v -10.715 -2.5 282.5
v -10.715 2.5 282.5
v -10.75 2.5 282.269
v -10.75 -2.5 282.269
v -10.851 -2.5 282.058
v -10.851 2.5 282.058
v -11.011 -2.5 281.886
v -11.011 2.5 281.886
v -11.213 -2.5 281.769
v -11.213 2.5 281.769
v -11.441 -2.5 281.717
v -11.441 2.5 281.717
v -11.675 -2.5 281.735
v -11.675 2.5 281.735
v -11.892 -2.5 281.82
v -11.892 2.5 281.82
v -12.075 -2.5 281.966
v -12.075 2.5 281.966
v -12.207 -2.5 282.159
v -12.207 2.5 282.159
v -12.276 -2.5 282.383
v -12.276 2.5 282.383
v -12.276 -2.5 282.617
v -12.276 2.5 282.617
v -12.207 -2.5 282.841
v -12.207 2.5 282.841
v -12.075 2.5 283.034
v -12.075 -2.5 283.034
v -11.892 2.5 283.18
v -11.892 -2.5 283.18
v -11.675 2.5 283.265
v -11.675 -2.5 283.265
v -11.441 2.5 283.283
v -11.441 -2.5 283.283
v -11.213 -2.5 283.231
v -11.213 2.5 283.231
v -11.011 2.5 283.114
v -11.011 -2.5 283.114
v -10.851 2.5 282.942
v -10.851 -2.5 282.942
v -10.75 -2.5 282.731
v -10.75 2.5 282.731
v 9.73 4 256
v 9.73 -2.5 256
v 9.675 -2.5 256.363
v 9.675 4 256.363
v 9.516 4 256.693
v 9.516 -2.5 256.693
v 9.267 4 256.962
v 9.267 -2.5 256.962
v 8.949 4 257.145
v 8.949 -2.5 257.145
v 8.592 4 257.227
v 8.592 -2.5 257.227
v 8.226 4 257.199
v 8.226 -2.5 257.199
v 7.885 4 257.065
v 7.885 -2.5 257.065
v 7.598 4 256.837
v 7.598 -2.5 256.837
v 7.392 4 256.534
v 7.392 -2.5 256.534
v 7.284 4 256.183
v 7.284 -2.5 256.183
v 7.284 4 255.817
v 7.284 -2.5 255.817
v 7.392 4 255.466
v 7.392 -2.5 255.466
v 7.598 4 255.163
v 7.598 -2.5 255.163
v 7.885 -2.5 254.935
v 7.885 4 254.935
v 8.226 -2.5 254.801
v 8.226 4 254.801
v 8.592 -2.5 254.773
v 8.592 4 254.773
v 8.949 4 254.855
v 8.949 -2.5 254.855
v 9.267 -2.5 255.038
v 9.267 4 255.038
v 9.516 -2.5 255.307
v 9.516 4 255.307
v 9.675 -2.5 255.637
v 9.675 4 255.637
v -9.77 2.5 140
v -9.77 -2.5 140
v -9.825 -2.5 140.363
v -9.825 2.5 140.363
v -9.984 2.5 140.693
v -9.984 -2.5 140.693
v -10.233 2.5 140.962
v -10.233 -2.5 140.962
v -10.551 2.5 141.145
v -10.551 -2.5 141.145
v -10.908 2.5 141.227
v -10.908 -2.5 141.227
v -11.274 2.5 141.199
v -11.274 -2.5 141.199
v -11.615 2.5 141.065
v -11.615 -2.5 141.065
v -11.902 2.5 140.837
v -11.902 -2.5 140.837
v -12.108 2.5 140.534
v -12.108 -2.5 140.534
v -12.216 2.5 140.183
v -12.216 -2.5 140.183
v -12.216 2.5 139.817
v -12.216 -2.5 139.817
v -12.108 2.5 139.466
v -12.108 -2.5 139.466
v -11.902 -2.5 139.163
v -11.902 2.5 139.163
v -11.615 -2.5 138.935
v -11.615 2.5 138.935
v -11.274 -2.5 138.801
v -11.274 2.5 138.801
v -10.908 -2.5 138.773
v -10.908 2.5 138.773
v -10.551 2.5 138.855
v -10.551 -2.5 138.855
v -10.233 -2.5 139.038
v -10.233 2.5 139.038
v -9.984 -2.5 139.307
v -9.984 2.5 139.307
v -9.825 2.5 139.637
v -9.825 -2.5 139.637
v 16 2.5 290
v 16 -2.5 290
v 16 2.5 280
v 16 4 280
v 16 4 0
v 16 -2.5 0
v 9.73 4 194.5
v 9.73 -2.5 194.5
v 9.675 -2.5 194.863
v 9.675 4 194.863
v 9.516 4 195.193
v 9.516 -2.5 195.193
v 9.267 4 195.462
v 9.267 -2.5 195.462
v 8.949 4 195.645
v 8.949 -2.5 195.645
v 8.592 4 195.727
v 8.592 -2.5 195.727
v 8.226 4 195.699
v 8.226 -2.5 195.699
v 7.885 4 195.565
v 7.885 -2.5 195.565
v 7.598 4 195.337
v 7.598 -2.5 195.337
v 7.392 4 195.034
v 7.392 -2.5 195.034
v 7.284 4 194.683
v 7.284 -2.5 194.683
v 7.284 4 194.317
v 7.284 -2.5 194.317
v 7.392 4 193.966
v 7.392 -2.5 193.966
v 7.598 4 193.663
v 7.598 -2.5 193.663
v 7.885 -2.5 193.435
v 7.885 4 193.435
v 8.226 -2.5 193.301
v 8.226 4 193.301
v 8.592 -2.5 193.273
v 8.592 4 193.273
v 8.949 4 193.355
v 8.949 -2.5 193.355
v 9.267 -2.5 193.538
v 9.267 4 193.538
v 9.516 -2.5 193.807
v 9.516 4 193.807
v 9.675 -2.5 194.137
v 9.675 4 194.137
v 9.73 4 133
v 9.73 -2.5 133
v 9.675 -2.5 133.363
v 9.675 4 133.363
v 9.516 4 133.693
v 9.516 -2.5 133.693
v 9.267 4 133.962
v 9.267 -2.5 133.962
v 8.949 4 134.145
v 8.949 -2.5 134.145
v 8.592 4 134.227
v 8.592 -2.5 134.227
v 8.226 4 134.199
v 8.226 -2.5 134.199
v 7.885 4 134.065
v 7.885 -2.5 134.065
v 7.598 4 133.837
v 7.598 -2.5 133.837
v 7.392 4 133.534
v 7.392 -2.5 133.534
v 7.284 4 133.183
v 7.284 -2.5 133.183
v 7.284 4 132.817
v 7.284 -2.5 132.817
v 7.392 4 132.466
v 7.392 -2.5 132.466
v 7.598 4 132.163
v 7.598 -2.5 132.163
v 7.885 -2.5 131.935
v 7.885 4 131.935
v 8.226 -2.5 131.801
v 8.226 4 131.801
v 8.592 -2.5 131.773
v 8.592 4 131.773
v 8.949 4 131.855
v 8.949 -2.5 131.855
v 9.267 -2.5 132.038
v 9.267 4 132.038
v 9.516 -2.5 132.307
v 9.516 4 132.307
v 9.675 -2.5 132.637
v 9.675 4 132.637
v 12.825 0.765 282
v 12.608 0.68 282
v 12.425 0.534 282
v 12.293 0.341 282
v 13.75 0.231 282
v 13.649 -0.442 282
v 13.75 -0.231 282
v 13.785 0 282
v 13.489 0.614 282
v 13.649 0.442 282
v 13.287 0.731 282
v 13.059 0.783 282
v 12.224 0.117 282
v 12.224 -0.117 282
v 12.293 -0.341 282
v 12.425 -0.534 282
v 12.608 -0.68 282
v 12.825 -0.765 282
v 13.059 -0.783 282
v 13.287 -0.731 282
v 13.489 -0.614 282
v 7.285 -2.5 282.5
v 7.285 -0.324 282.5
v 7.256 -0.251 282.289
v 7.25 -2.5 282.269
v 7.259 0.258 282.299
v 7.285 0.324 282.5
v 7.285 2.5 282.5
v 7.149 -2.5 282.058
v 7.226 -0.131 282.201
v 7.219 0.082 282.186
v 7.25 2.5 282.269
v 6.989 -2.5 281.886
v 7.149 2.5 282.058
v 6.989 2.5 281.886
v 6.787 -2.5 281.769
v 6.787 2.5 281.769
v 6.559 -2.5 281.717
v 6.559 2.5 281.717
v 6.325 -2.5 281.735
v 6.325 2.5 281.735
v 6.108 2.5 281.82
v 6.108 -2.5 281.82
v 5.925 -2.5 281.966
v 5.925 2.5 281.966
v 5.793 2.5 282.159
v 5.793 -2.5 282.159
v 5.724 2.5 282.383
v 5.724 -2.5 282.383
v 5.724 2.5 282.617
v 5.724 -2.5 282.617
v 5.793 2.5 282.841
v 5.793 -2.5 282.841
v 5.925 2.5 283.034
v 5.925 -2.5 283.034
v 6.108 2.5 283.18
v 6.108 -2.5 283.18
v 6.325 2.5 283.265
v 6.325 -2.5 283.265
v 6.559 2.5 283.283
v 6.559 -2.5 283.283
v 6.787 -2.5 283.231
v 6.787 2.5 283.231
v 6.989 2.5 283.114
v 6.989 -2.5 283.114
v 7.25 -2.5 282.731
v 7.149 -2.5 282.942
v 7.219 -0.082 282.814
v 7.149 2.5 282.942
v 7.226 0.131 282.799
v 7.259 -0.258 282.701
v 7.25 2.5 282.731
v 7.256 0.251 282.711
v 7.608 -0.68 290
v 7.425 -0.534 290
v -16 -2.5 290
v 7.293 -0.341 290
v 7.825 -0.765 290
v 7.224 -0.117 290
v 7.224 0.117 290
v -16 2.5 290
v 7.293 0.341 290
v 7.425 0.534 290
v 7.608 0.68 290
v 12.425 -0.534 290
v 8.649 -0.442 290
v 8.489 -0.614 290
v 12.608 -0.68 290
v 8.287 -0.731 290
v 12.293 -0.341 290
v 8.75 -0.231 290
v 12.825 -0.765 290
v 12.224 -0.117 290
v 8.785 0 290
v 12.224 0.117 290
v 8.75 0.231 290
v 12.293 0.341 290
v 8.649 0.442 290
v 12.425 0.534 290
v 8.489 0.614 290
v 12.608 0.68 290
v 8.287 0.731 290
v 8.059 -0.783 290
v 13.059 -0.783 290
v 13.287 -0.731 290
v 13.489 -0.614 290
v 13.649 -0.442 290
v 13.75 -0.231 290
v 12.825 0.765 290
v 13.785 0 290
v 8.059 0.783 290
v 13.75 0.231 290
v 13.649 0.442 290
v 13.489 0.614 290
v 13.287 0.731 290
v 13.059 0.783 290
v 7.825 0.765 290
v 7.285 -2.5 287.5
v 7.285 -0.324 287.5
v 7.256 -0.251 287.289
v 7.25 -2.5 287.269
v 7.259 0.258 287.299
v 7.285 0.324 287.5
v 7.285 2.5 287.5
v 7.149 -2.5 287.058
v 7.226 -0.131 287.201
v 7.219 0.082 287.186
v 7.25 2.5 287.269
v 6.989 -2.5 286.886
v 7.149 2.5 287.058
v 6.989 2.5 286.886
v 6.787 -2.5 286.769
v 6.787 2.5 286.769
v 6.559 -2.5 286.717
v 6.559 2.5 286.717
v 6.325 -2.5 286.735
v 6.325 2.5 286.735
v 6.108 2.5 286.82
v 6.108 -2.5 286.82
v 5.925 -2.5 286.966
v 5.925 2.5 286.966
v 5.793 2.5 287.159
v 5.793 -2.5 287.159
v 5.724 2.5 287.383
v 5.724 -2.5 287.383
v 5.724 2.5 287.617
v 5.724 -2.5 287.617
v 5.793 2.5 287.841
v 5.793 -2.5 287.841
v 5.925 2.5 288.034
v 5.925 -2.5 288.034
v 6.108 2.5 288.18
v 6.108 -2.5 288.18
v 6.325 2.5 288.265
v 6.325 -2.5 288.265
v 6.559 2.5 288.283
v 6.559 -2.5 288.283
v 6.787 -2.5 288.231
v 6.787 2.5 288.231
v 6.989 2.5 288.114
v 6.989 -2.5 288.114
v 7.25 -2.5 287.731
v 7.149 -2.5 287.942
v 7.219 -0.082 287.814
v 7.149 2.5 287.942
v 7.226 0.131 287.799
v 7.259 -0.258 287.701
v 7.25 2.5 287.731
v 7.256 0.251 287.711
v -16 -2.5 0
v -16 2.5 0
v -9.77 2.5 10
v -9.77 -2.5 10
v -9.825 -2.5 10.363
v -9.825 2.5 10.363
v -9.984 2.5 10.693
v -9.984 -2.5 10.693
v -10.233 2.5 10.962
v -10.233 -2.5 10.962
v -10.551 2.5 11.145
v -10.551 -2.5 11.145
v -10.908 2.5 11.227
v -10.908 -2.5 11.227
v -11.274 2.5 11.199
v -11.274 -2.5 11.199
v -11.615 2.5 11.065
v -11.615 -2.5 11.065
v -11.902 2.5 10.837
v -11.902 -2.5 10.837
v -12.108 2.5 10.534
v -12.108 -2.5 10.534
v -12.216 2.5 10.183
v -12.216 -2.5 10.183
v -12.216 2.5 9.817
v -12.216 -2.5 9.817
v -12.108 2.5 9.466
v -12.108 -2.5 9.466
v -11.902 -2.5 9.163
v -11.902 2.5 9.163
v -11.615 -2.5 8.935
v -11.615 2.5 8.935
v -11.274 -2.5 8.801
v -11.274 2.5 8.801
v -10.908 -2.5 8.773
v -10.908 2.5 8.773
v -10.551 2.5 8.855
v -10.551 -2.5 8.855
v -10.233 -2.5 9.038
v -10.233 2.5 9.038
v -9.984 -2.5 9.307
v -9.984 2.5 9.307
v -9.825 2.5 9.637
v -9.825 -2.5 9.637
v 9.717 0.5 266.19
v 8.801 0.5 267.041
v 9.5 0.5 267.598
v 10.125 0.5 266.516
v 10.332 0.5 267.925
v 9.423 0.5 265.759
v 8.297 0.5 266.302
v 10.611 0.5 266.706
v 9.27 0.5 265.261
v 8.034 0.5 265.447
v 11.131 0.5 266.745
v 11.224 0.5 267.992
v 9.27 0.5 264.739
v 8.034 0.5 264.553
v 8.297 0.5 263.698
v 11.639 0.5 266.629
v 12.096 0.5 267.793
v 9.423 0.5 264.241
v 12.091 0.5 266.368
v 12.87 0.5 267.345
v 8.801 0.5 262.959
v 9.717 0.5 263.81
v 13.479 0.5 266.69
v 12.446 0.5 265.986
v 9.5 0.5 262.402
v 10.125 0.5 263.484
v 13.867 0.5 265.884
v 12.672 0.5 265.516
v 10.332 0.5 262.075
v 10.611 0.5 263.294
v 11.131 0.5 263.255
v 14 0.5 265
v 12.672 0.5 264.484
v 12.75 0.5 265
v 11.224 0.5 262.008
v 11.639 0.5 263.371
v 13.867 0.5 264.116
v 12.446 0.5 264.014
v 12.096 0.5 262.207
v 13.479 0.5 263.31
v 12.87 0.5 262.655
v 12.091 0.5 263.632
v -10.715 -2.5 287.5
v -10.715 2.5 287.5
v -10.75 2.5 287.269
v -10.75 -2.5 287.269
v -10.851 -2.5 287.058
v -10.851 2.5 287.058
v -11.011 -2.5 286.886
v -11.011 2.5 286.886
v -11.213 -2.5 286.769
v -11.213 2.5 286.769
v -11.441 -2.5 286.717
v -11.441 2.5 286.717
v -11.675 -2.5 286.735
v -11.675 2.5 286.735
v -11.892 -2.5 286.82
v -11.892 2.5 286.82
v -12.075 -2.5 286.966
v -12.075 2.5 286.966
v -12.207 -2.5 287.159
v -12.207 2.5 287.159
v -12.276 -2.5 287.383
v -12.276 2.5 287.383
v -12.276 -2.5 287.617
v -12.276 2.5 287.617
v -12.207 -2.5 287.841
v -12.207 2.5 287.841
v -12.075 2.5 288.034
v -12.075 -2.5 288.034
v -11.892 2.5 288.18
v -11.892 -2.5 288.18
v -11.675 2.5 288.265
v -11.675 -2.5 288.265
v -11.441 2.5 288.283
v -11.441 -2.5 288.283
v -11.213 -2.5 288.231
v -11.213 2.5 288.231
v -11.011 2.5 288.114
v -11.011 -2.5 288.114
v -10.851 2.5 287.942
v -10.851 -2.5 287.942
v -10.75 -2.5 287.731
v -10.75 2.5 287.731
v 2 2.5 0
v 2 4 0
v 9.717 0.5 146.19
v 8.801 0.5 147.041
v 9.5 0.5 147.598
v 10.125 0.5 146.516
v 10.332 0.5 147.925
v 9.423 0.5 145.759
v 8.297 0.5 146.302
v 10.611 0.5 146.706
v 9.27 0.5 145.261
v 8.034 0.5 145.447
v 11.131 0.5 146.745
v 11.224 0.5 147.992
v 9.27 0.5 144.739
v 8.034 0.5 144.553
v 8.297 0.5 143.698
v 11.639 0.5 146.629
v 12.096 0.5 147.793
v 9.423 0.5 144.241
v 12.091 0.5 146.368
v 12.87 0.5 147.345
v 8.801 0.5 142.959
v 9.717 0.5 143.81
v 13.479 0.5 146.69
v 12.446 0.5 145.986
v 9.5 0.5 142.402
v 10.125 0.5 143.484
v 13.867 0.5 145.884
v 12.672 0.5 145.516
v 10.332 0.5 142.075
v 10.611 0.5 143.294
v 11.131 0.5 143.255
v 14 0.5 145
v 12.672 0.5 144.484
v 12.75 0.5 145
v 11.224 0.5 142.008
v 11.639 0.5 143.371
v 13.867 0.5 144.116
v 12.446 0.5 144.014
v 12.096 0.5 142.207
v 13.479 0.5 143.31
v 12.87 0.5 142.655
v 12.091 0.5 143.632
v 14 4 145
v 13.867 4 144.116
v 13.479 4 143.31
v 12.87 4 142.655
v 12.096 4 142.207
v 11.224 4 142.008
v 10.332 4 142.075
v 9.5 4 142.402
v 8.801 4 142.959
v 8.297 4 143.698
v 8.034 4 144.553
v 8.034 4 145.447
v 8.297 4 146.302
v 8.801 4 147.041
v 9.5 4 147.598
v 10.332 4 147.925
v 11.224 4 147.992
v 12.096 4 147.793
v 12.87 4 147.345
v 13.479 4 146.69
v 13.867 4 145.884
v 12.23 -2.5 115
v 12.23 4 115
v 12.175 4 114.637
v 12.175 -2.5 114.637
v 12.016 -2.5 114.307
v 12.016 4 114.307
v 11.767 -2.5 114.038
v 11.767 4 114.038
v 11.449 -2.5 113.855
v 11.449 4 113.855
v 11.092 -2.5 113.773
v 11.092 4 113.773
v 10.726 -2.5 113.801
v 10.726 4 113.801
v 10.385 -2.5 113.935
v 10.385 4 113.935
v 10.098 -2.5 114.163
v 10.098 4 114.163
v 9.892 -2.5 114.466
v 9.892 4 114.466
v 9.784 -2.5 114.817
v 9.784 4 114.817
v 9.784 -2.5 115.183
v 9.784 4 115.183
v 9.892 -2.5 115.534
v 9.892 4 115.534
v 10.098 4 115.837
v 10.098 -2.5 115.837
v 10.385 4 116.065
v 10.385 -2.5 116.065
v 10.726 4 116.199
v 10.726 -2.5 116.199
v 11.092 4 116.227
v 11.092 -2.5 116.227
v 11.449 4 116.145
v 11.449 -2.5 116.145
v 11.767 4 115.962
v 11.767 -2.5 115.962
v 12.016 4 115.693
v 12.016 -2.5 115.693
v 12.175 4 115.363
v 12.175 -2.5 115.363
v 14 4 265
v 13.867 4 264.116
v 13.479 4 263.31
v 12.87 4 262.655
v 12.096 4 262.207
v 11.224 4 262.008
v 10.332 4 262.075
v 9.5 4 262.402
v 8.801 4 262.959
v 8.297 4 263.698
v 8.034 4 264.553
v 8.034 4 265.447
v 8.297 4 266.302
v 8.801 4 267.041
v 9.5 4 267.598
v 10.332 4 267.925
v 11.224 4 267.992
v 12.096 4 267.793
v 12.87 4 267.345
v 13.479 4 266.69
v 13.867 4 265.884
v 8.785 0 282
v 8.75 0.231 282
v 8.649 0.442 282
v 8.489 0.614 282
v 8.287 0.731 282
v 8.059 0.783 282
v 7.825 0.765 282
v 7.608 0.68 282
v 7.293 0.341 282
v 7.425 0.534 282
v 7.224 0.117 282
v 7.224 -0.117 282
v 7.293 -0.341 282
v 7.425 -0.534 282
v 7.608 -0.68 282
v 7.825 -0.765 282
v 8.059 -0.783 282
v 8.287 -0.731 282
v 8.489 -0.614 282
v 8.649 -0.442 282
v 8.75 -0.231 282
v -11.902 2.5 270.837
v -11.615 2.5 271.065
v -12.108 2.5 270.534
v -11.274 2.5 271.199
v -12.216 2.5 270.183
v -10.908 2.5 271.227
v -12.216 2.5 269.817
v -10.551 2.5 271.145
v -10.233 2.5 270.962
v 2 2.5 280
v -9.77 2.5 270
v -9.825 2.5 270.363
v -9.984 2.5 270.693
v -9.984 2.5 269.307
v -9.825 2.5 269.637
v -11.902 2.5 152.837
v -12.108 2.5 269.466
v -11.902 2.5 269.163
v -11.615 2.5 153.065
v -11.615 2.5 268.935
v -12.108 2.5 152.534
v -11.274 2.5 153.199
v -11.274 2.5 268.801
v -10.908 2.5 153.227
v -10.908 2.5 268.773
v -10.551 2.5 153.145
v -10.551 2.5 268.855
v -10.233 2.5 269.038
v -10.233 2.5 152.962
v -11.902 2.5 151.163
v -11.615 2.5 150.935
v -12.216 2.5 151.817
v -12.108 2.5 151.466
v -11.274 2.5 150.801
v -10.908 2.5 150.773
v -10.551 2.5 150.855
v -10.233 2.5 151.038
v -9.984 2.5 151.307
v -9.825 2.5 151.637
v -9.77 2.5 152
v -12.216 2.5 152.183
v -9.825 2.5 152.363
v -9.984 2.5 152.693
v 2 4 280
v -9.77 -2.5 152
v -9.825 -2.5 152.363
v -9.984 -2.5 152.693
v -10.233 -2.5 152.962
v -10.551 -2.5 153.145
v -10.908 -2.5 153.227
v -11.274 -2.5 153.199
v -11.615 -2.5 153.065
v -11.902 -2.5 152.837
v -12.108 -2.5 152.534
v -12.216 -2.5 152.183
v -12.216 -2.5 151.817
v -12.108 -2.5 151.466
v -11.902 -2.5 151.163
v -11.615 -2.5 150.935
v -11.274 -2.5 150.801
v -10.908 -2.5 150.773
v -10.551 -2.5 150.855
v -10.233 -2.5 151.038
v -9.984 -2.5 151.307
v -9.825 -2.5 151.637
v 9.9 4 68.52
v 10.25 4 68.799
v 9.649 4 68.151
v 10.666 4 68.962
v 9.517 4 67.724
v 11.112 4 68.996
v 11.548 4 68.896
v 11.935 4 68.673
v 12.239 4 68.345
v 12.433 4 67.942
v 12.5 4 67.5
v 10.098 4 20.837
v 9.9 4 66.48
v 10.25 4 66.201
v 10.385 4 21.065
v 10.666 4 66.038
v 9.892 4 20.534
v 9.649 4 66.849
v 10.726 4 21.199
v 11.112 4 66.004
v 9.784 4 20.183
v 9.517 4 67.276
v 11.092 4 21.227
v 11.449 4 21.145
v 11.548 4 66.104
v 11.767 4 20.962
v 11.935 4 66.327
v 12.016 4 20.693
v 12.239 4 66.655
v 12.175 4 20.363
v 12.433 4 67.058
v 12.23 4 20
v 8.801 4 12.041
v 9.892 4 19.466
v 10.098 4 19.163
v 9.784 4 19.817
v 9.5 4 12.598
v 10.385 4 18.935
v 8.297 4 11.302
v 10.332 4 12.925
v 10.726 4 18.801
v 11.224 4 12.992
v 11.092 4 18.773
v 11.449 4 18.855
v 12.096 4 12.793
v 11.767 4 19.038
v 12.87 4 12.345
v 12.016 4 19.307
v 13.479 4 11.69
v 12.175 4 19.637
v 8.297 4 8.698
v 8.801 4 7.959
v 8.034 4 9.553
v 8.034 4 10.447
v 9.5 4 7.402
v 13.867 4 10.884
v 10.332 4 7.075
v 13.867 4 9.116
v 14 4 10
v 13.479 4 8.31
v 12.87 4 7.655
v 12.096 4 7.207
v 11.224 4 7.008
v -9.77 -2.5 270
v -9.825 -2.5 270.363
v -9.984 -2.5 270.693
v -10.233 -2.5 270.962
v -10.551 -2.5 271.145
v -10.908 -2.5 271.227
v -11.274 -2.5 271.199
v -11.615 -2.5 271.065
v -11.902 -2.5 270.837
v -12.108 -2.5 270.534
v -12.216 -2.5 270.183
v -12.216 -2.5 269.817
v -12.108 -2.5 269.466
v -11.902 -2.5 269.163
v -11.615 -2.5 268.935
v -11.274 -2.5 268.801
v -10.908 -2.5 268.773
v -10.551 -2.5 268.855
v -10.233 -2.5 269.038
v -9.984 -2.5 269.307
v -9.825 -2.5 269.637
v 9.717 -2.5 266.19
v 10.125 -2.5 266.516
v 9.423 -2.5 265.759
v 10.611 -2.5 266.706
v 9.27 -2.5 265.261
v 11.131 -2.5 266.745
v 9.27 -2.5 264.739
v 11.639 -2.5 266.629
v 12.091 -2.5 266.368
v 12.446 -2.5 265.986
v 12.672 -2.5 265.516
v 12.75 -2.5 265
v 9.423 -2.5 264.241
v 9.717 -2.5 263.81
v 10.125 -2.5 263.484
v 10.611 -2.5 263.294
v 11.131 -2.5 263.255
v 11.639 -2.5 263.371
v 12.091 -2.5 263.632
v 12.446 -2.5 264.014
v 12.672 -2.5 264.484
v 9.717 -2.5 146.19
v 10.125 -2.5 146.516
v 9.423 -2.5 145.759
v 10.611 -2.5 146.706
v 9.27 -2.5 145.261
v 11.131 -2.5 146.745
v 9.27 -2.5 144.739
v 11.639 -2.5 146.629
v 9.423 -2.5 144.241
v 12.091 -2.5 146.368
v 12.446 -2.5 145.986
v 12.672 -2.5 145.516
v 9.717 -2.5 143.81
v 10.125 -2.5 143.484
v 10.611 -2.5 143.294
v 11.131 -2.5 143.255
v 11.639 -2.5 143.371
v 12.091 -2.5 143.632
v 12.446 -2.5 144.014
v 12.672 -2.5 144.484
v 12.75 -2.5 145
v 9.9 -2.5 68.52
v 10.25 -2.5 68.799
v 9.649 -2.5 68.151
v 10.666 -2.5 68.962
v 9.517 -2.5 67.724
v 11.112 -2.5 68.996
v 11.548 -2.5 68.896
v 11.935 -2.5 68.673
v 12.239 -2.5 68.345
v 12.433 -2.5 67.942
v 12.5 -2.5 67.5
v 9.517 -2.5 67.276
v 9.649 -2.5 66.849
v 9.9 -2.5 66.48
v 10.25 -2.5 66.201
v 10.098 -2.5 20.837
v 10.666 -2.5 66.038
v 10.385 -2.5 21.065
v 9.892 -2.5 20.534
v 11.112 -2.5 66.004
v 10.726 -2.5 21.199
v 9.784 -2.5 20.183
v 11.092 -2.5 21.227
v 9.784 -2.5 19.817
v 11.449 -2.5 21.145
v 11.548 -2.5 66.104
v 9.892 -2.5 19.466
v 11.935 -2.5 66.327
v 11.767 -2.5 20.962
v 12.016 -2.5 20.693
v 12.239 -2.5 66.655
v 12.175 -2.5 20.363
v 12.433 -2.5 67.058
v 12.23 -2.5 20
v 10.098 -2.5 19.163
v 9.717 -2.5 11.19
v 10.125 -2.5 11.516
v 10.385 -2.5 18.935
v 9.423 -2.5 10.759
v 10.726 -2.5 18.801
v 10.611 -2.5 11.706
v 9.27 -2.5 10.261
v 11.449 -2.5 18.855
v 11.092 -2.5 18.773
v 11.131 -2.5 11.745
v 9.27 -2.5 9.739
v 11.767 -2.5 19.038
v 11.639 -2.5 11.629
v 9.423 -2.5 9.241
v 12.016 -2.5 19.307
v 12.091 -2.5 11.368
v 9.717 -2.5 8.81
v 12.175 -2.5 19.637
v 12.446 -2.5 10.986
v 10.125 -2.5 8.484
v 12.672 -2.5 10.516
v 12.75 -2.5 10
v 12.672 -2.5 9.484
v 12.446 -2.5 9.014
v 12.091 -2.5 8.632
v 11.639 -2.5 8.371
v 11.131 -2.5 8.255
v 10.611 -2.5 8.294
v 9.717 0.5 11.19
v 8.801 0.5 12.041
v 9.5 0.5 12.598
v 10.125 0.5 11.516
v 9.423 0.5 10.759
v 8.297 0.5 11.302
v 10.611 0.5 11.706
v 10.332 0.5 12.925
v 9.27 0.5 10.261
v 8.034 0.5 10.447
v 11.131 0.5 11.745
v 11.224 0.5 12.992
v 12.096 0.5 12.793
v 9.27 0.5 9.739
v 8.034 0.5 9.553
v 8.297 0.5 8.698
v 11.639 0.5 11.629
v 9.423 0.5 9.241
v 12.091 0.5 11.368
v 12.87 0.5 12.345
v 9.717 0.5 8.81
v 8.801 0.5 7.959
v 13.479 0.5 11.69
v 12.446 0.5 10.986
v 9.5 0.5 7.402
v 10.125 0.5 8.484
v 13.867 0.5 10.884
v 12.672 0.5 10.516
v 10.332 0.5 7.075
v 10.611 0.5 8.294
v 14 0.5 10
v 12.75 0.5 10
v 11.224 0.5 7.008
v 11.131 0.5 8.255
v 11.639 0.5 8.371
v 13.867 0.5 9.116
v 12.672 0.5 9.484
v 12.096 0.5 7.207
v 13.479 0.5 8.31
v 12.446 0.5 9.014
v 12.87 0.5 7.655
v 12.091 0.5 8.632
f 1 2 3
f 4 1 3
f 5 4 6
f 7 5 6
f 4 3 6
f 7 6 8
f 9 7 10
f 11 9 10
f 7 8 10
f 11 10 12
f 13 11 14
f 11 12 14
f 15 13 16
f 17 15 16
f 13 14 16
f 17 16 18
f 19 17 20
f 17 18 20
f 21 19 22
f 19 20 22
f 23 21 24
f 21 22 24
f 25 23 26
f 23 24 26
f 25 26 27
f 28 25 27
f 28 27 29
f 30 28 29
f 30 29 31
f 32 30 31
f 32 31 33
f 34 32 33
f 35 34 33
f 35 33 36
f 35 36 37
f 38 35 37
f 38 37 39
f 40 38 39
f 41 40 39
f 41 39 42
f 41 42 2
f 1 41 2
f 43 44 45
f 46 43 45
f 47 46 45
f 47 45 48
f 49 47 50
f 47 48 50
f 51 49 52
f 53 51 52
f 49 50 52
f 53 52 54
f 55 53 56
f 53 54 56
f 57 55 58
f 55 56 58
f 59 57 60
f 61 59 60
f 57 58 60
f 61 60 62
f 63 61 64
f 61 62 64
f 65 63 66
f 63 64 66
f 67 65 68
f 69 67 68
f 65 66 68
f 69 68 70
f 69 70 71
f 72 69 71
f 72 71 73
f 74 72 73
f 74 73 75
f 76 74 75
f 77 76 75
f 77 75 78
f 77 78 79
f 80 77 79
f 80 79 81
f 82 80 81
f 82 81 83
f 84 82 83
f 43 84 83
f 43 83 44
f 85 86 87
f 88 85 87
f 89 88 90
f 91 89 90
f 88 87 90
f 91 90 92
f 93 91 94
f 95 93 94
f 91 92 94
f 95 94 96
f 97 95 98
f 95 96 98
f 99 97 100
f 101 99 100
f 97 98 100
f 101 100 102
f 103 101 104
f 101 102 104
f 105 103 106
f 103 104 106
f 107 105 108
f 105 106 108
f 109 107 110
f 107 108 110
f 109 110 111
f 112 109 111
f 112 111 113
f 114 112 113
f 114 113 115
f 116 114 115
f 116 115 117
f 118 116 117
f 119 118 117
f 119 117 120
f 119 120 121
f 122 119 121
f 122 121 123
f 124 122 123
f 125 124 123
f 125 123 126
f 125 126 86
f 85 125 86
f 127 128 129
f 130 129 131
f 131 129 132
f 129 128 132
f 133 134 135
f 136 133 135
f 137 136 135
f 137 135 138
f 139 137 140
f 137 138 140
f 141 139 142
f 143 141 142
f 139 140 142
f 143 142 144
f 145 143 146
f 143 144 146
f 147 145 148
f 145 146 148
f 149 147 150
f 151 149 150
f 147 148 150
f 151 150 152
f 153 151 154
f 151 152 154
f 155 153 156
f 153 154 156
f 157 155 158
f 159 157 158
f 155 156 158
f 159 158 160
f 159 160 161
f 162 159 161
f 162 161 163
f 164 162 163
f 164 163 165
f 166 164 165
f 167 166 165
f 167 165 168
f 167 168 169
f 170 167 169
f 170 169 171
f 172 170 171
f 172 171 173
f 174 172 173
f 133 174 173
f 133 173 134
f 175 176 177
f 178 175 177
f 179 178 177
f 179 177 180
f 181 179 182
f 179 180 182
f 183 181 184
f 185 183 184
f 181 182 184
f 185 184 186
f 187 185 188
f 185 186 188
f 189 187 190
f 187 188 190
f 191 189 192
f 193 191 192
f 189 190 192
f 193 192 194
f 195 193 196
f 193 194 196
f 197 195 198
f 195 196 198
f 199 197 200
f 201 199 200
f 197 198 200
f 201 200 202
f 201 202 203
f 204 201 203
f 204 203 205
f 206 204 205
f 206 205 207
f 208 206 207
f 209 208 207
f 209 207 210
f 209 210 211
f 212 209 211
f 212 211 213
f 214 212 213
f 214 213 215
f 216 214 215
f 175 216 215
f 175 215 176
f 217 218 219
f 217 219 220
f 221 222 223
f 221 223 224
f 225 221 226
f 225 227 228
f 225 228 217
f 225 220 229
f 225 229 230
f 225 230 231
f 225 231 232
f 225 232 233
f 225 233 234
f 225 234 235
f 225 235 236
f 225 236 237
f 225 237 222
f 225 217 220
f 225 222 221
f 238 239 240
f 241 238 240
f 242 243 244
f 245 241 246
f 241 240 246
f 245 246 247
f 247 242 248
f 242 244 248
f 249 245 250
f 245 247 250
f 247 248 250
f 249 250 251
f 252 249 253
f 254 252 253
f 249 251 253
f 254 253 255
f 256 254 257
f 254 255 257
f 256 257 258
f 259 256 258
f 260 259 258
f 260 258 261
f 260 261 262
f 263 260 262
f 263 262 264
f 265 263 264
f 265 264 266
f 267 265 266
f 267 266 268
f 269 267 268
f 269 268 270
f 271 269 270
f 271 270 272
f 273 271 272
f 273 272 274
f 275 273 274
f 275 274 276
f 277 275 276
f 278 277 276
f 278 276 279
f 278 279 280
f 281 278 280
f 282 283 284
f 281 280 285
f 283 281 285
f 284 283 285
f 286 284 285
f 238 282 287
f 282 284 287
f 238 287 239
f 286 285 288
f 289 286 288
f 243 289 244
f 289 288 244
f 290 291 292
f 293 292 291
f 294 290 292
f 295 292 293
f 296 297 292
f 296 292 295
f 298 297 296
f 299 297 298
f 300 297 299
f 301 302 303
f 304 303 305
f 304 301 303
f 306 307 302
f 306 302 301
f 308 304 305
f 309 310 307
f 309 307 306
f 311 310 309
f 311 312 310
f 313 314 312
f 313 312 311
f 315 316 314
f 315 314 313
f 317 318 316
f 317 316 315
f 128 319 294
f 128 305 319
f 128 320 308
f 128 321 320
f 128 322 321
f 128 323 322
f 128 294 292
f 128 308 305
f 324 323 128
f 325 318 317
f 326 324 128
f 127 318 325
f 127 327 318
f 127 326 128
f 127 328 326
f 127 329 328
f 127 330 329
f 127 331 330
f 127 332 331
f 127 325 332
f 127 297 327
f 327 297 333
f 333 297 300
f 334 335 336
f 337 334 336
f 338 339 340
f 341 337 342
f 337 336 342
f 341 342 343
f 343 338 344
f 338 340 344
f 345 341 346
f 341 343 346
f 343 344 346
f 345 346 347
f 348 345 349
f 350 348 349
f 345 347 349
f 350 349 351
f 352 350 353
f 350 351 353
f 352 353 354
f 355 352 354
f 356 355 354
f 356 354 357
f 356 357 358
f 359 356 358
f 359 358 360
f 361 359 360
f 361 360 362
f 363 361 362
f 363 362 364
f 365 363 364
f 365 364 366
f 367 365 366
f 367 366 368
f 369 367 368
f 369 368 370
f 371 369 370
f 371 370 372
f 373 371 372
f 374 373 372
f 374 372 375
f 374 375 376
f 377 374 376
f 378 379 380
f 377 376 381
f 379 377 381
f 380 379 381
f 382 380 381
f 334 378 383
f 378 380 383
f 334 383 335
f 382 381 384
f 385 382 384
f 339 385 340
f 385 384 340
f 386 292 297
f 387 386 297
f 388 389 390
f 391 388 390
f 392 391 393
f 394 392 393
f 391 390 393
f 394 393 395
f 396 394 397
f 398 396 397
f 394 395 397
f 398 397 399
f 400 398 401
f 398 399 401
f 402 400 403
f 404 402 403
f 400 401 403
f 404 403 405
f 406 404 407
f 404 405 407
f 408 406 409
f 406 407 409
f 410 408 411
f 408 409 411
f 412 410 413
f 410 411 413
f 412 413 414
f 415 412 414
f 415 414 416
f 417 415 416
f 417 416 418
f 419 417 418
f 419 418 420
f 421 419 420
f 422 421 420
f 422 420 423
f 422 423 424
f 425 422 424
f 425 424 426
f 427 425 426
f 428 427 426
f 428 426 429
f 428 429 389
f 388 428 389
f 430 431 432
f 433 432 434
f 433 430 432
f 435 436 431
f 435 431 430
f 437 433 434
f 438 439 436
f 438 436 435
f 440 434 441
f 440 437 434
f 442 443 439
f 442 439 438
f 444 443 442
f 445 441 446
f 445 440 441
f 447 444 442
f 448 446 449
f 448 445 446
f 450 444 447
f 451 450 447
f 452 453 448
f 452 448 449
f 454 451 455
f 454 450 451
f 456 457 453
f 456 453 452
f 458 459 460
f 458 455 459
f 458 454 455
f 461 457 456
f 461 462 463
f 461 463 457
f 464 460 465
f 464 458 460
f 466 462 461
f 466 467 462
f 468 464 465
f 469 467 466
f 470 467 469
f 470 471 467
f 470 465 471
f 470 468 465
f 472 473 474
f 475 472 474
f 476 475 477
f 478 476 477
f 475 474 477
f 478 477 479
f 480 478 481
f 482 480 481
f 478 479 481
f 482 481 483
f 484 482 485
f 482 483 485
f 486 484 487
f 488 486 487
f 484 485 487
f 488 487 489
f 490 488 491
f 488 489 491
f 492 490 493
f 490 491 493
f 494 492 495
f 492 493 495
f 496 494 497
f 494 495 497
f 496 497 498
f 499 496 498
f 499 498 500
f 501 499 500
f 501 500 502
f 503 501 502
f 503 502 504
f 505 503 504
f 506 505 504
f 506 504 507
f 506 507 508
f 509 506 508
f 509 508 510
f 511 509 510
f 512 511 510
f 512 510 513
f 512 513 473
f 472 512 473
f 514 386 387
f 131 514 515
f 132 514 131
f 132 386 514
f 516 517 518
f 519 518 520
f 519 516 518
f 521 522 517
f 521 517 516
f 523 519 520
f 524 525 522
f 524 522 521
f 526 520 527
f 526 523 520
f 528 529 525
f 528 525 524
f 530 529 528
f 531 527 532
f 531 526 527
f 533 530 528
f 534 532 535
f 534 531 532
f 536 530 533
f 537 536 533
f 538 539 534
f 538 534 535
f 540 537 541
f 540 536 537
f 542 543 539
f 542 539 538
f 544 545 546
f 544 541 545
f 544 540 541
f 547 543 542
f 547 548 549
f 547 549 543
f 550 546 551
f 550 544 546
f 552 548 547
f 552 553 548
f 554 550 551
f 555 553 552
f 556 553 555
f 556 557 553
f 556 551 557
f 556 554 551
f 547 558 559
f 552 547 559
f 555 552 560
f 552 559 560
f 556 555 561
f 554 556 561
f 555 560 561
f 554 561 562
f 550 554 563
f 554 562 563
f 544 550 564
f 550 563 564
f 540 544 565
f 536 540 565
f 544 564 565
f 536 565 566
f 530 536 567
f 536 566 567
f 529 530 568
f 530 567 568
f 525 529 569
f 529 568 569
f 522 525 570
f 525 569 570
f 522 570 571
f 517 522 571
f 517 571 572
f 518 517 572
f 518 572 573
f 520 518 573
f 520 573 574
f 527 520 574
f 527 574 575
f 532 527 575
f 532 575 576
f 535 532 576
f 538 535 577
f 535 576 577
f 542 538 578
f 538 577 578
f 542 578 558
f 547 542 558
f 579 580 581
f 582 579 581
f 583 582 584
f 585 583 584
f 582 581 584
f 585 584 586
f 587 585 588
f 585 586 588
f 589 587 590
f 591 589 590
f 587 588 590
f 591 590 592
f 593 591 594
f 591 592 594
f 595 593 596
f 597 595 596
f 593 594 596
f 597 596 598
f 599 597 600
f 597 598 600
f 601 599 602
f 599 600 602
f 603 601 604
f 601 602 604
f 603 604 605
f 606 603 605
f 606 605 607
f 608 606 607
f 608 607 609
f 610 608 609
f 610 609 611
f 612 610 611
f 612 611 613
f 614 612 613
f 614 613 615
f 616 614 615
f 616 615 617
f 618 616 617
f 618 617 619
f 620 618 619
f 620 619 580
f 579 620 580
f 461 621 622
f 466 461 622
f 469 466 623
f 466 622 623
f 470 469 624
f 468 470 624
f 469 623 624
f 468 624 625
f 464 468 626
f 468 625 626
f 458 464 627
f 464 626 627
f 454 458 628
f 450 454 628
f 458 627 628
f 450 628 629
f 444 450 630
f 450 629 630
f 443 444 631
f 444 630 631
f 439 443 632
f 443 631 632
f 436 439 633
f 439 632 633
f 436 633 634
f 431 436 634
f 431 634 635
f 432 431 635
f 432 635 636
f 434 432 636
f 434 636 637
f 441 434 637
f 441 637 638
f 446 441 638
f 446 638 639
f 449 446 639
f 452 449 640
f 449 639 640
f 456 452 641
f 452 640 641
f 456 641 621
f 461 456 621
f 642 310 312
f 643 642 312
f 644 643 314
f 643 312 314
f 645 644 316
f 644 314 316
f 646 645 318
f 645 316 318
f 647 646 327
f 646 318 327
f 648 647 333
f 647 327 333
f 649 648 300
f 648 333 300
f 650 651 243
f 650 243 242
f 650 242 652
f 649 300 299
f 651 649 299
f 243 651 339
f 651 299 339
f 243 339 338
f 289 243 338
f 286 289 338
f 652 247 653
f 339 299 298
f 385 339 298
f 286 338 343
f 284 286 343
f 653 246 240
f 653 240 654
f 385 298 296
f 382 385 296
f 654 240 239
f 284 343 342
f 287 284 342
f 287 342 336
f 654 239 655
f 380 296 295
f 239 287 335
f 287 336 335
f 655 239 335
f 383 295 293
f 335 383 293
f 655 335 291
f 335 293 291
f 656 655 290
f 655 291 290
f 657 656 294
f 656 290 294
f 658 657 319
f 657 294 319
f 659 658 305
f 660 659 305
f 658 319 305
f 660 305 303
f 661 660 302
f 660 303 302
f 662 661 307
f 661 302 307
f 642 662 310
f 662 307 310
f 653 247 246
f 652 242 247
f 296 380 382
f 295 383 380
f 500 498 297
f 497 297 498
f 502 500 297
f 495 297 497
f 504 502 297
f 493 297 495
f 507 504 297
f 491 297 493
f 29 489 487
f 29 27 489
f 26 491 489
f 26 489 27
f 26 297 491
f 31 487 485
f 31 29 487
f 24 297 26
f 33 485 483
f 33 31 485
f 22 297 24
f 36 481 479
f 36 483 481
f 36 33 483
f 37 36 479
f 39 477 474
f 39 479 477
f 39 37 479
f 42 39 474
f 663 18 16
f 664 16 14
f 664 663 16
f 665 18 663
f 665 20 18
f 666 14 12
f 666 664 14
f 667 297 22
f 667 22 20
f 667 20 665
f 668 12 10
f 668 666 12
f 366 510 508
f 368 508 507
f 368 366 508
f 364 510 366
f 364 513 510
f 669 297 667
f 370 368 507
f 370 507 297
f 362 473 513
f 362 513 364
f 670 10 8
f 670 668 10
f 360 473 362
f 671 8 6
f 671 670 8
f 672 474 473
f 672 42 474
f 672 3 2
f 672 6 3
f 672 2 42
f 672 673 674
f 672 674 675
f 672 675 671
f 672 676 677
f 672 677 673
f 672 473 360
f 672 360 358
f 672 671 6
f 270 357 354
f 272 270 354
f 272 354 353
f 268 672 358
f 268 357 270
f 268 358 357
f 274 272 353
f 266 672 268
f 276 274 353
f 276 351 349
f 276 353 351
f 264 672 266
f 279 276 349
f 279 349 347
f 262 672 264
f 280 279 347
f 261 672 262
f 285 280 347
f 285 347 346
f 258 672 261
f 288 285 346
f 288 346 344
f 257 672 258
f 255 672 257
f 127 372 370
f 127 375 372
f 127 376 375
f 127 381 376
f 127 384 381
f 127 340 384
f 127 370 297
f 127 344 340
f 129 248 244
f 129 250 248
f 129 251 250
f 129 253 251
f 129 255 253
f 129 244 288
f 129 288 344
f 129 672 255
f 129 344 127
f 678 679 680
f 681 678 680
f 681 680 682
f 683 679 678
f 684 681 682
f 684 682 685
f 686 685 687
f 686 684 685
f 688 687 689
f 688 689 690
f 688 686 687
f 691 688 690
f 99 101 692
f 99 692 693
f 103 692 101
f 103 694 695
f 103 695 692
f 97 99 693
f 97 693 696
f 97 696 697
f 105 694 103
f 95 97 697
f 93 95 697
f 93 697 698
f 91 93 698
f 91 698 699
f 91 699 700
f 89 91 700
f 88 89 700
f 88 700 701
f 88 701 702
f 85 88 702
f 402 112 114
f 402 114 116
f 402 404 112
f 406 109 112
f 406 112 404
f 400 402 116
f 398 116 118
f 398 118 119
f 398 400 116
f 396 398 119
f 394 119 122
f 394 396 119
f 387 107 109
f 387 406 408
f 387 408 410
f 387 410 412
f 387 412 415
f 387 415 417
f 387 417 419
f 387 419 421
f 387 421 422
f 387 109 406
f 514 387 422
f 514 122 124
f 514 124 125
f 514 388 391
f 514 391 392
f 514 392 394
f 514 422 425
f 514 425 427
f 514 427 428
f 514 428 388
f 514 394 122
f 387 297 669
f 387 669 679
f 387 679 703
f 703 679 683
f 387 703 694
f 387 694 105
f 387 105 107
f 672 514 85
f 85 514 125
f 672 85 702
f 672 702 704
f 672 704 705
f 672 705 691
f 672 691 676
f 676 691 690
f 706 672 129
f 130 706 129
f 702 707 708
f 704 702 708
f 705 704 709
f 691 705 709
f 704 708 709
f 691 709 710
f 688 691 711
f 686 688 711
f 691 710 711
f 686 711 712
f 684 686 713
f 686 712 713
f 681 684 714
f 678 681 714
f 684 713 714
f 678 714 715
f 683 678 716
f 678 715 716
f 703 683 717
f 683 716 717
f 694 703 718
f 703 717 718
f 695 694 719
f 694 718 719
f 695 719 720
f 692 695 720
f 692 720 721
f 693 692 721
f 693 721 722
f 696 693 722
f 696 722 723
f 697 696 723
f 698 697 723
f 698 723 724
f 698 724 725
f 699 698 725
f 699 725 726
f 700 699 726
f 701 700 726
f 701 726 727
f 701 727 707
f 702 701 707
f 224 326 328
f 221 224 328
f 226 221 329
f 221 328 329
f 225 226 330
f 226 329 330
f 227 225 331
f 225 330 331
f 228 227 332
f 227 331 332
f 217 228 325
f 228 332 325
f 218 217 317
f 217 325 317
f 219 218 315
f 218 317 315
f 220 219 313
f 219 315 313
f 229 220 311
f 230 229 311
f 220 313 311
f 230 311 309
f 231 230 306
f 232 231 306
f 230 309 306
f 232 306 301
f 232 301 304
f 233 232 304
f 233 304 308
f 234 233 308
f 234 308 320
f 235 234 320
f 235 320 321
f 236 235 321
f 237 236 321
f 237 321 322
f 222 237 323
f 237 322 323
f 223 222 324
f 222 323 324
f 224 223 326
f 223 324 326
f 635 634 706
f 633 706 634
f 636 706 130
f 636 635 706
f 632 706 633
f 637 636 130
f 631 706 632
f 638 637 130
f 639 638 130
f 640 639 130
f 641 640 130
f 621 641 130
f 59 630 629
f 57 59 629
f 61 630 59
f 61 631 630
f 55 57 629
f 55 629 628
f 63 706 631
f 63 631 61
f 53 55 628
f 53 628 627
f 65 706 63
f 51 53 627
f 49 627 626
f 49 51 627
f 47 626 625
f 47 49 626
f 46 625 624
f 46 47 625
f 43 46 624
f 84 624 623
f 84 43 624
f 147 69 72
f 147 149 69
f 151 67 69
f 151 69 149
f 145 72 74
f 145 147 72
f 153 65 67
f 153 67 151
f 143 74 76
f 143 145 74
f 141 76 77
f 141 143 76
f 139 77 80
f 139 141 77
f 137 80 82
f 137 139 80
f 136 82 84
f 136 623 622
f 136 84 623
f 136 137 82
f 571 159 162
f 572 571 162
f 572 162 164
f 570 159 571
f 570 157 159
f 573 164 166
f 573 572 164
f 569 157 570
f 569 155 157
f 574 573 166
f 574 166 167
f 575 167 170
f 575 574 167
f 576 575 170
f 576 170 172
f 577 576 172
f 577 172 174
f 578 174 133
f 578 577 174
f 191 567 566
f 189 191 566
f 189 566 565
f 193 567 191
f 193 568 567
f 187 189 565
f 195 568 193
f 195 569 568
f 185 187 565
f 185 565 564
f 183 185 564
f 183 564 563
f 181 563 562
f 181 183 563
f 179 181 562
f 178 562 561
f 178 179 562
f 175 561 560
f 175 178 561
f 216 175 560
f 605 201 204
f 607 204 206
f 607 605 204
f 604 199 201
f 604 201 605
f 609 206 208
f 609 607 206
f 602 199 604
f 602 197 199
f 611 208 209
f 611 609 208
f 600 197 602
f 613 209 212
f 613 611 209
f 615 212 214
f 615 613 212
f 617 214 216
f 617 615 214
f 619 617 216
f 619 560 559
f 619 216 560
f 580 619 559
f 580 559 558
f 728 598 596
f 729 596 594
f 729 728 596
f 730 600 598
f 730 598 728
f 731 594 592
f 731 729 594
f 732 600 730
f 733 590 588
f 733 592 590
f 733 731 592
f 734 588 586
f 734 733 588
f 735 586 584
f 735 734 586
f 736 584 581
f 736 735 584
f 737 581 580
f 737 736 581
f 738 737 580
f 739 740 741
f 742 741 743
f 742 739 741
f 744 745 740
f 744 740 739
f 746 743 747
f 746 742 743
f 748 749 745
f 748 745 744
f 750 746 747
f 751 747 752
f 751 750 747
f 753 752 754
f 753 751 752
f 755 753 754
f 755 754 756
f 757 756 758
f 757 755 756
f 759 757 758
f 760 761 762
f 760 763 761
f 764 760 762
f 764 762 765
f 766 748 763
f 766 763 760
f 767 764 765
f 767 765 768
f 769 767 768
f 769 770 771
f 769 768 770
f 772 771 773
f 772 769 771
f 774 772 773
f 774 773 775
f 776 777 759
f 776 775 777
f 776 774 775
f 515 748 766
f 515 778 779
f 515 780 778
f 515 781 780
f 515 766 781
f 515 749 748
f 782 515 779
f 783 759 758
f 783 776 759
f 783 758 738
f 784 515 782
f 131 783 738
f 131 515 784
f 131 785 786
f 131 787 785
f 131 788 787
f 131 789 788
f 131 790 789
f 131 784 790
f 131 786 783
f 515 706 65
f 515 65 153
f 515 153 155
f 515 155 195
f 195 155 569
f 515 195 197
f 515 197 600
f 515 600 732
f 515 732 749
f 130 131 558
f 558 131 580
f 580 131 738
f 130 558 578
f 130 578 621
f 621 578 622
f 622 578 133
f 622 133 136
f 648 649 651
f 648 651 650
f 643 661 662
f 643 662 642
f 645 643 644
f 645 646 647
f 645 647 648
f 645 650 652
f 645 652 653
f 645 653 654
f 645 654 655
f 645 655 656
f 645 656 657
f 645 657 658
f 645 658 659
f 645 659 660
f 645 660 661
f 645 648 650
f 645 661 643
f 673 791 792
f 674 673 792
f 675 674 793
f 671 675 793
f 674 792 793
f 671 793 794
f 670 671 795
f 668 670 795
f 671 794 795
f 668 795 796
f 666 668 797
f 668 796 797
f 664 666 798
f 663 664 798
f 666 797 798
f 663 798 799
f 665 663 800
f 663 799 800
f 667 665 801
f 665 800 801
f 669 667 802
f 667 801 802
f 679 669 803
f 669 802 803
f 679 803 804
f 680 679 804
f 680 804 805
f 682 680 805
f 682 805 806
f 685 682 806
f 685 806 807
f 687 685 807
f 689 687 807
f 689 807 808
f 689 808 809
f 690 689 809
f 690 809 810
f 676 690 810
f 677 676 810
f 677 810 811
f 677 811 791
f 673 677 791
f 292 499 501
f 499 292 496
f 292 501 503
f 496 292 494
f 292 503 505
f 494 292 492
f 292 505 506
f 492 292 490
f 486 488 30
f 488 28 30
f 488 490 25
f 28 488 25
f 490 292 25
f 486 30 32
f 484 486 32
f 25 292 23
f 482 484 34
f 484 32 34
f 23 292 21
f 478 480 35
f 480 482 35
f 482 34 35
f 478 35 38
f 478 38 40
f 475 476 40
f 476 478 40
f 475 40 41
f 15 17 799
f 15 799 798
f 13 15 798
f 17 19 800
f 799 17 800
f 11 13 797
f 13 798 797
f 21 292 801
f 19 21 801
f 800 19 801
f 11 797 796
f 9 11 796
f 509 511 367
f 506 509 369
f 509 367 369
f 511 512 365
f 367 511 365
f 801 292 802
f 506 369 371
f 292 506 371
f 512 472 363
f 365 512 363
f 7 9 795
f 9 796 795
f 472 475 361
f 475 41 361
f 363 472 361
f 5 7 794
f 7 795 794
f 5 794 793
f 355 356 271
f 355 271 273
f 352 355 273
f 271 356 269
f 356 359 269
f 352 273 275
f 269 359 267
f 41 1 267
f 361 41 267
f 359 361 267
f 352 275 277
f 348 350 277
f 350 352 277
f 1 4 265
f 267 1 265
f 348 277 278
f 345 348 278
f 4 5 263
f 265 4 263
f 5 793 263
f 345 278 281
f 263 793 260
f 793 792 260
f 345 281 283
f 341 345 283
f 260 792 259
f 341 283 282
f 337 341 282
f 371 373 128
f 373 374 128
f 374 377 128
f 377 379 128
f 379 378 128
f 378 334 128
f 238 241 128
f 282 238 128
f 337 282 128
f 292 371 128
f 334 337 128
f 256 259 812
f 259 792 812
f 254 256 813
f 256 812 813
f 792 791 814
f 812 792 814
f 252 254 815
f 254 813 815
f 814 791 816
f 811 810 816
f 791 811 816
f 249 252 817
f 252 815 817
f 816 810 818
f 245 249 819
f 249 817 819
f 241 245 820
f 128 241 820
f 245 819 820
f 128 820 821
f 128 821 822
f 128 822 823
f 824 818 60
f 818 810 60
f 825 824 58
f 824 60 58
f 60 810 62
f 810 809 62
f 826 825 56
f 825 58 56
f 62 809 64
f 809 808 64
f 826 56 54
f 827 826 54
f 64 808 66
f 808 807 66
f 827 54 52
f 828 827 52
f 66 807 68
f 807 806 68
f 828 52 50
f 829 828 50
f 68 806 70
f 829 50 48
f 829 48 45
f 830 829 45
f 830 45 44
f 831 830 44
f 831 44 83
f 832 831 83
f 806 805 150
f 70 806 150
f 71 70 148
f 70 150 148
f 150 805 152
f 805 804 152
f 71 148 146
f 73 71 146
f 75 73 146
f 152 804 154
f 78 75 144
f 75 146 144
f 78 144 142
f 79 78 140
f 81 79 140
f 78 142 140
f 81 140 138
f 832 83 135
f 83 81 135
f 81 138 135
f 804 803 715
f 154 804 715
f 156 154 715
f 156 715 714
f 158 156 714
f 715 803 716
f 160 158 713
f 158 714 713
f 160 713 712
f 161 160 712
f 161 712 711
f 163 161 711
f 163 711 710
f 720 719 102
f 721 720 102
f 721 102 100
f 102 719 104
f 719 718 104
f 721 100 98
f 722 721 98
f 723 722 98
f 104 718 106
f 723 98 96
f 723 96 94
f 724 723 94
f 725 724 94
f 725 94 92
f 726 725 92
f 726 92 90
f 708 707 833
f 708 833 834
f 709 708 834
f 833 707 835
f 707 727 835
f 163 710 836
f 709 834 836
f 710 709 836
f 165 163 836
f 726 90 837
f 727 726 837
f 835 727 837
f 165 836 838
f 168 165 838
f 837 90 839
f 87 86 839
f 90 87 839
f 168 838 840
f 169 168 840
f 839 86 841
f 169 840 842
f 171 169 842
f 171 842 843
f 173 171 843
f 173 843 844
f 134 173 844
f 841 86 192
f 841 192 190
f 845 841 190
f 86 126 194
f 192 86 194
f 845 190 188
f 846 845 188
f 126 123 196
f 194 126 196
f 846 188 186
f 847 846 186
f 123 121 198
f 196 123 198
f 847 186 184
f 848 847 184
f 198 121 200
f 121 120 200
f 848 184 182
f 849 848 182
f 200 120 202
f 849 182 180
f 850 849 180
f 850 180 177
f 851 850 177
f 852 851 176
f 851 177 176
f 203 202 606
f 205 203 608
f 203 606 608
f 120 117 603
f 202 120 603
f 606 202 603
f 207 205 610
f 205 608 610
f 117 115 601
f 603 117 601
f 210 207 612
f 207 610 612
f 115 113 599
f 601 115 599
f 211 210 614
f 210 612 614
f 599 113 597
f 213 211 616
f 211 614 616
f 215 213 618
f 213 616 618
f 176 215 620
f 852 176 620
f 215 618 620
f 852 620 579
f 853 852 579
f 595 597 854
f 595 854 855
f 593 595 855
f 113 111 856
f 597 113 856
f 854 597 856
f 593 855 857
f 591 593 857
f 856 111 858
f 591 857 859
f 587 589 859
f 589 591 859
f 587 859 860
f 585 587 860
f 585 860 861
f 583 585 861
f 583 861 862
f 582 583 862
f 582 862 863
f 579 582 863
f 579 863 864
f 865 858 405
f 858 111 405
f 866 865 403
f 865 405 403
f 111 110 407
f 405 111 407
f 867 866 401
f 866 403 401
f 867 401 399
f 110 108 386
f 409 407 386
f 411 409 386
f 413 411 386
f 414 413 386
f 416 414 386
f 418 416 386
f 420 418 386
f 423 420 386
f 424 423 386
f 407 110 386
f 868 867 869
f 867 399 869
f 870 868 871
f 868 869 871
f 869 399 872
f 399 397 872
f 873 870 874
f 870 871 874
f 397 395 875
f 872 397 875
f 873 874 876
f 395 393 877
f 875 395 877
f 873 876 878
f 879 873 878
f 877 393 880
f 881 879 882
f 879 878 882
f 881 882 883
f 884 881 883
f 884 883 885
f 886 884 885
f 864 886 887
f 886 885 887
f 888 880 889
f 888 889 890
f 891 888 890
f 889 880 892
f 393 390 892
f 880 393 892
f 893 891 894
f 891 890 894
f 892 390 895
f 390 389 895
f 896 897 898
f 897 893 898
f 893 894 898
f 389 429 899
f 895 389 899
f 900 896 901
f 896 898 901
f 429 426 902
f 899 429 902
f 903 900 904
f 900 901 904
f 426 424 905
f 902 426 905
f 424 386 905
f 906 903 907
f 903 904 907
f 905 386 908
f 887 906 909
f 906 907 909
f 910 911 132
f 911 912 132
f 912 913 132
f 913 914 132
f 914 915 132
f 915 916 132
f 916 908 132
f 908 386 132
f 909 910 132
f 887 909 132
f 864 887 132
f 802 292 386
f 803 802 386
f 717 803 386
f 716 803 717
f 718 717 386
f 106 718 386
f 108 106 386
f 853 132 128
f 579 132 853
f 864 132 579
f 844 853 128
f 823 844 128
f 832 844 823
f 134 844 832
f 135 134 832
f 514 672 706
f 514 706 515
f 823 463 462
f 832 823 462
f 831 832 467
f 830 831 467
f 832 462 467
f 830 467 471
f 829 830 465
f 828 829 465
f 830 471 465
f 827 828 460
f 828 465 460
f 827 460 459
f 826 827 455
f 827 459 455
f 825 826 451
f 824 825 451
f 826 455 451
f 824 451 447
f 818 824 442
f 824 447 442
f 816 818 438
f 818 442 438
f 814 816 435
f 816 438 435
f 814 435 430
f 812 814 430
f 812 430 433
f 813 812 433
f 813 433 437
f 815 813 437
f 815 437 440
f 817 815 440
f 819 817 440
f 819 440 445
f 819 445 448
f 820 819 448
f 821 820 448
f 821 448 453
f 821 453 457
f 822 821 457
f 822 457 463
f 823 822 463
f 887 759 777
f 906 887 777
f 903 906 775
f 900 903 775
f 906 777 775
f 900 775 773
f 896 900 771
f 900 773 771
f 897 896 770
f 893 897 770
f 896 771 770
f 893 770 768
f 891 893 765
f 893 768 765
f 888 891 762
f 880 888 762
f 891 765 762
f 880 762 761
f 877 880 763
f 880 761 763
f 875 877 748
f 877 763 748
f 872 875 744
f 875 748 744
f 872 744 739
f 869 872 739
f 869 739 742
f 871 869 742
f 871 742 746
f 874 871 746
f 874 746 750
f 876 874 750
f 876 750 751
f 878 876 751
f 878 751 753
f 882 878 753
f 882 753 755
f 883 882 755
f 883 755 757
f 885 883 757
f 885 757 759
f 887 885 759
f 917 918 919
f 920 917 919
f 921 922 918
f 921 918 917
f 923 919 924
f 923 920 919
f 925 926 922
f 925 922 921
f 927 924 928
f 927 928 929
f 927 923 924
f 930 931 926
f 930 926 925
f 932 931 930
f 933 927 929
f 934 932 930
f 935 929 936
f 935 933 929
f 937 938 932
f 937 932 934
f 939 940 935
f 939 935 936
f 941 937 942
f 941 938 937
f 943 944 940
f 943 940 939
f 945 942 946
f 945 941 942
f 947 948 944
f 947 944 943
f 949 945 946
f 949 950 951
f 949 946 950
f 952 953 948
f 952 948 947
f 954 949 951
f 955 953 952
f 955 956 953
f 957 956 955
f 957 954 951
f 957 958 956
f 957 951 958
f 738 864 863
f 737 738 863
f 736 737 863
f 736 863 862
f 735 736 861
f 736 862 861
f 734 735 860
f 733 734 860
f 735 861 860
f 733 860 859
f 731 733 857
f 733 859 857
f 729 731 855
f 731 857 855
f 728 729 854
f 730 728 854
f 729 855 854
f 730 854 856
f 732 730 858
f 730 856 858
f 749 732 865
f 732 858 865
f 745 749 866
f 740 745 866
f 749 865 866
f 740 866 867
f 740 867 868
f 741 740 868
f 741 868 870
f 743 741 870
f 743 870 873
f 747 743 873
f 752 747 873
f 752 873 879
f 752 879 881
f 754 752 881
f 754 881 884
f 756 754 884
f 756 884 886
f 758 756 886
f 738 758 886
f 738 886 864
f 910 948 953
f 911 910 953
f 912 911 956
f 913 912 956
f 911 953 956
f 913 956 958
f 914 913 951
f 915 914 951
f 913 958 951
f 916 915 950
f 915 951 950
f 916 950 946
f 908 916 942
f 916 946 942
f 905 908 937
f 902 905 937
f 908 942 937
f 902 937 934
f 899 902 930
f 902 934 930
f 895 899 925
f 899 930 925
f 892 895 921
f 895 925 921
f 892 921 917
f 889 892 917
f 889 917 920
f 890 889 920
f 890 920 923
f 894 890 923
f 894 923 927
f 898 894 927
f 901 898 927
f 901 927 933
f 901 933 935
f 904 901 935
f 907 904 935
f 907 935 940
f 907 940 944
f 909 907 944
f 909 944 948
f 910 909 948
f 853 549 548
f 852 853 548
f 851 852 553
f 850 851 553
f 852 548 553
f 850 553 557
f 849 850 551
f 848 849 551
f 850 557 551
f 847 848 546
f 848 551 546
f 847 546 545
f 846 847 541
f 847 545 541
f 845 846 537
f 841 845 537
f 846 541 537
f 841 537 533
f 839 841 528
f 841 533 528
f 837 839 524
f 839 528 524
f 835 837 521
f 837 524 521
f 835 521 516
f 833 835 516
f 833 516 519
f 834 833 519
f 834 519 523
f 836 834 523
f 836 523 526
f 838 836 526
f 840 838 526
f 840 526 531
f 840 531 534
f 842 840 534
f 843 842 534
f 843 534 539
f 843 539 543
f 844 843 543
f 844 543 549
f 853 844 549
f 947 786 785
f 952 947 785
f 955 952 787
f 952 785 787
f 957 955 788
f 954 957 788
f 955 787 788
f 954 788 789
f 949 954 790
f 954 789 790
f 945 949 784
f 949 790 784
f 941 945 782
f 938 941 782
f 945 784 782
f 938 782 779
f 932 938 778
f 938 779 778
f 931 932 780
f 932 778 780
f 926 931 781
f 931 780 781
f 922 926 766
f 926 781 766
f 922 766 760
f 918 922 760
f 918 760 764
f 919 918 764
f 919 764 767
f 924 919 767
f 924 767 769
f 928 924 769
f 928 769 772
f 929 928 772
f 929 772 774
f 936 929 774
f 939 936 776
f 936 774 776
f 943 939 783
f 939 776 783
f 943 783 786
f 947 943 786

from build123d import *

# Parameters (mm, degrees)
SKETCH1_W           = 32
SKETCH1_H           = 5
BOSS_EXTRUDE1_DEPTH = 290
SKETCH2_W           = 14
SKETCH2_H           = 280
BOSS_EXTRUDE2_DEPTH = 1.5
SKETCH3_R           = 3
CUT_EXTRUDE1_DEPTH  = 3.5
SKETCH4_R           = 1.75
CUT_EXTRUDE2_DEPTH  = 4
SKETCH5_R           = 0.785
CUT_EXTRUDE3_DEPTH  = 6
SKETCH6_R           = 1.23
CUT_EXTRUDE4_DEPTH  = 7.5
LPATTERN1_COUNT     = 2
LPATTERN1_PITCH     = 95
SKETCH7_R           = 1.23
CUT_EXTRUDE5_DEPTH  = 7.5
SKETCH8_R           = 1.23
CUT_EXTRUDE6_DEPTH  = 7.5
LPATTERN2_COUNT     = 3
LPATTERN2_PITCH     = 61.5
SKETCH9_R           = 1.5
CUT_EXTRUDE7_DEPTH  = 7.5
SKETCH10_R          = 0.785
CUT_EXTRUDE8_DEPTH  = 8


with BuildPart() as part:
    # Sketch1 → Boss-Extrude1 (new body)
    with BuildSketch(Plane.XY):
        Rectangle(SKETCH1_W, SKETCH1_H)
    extrude(amount=BOSS_EXTRUDE1_DEPTH)

    # Sketch2 → Boss-Extrude2 (add)
    with BuildSketch(Plane(origin=(0, 2.5, 0), x_dir=(1, 0, 0), z_dir=(0, 1, 0))):
        with Locations((9, -140)):
            Rectangle(SKETCH2_W, SKETCH2_H)
    extrude(amount=BOSS_EXTRUDE2_DEPTH)

    # Sketch3 → Cut-Extrude1 (cut)
    with BuildSketch(Plane(origin=(0, 4, 0), x_dir=(1, 0, 0), z_dir=(0, 1, 0))):
        with Locations((11, -10)):
            Circle(SKETCH3_R)
        with Locations((11, -145)):
            Circle(SKETCH3_R)
        with Locations((11, -265)):
            Circle(SKETCH3_R)
    extrude(amount=-CUT_EXTRUDE1_DEPTH, mode=Mode.SUBTRACT)

    # Sketch4 → Cut-Extrude2 (cut, through all)
    with BuildSketch(Plane(origin=(0, 0.5, 0), x_dir=(1, 0, 0), z_dir=(0, 1, 0))):
        with Locations((11, -10)):
            Circle(SKETCH4_R)
        with Locations((11, -145)):
            Circle(SKETCH4_R)
        with Locations((11, -265)):
            Circle(SKETCH4_R)
    extrude(amount=-CUT_EXTRUDE2_DEPTH, mode=Mode.SUBTRACT)

    # Sketch5 → Cut-Extrude3 (cut, through all)
    with BuildSketch(Plane(origin=(0, 2.5, 0), x_dir=(1, 0, 0), z_dir=(0, 1, 0))):
        with Locations((-11.5, -282.5)):
            Circle(SKETCH5_R)
        with Locations((6.5, -282.5)):
            Circle(SKETCH5_R)
        with Locations((-11.5, -287.5)):
            Circle(SKETCH5_R)
        with Locations((6.5, -287.5)):
            Circle(SKETCH5_R)
    extrude(amount=-CUT_EXTRUDE3_DEPTH, mode=Mode.SUBTRACT)

    # Sketch6 → Cut-Extrude4 (cut, through all)
    with BuildSketch(Plane(origin=(0, 4, 0), x_dir=(1, 0, 0), z_dir=(0, 1, 0))):
        with Locations((11, -20)):
            Circle(SKETCH6_R)
    cut_extrude4 = extrude(amount=-CUT_EXTRUDE4_DEPTH, mode=Mode.SUBTRACT)

    # LPattern1: Cut-Extrude4 ×2
    with Locations(*[(0, 0, i * LPATTERN1_PITCH) for i in range(1, LPATTERN1_COUNT)]):
        add(cut_extrude4, mode=Mode.SUBTRACT)

    # Sketch7 → Cut-Extrude5 (cut, through all)
    with BuildSketch(Plane.XZ.offset(2.5)):
        with Locations((-11, 10)):
            Circle(SKETCH7_R)
        with Locations((-11, 140)):
            Circle(SKETCH7_R)
        with Locations((-11, 152)):
            Circle(SKETCH7_R)
        with Locations((-11, 270)):
            Circle(SKETCH7_R)
    extrude(amount=-CUT_EXTRUDE5_DEPTH, mode=Mode.SUBTRACT)

    # Sketch8 → Cut-Extrude6 (cut, through all)
    with BuildSketch(Plane.XZ.offset(2.5)):
        with Locations((8.5, 133)):
            Circle(SKETCH8_R)
    cut_extrude6 = extrude(amount=-CUT_EXTRUDE6_DEPTH, mode=Mode.SUBTRACT)

    # LPattern2: Cut-Extrude6 ×3
    with Locations(*[(0, 0, i * LPATTERN2_PITCH) for i in range(1, LPATTERN2_COUNT)]):
        add(cut_extrude6, mode=Mode.SUBTRACT)

    # Sketch9 → Cut-Extrude7 (cut, through all)
    with BuildSketch(Plane.XZ.offset(2.5)):
        with Locations((11, 67.5)):
            Circle(SKETCH9_R)
    extrude(amount=-CUT_EXTRUDE7_DEPTH, mode=Mode.SUBTRACT)

    # Sketch10 → Cut-Extrude8 (cut)
    with BuildSketch(Plane.XY.offset(290)):
        with Locations((13, 0)):
            Circle(SKETCH10_R)
        with Locations((8, 0)):
            Circle(SKETCH10_R)
    extrude(amount=-CUT_EXTRUDE8_DEPTH, mode=Mode.SUBTRACT)


solid = part.part
